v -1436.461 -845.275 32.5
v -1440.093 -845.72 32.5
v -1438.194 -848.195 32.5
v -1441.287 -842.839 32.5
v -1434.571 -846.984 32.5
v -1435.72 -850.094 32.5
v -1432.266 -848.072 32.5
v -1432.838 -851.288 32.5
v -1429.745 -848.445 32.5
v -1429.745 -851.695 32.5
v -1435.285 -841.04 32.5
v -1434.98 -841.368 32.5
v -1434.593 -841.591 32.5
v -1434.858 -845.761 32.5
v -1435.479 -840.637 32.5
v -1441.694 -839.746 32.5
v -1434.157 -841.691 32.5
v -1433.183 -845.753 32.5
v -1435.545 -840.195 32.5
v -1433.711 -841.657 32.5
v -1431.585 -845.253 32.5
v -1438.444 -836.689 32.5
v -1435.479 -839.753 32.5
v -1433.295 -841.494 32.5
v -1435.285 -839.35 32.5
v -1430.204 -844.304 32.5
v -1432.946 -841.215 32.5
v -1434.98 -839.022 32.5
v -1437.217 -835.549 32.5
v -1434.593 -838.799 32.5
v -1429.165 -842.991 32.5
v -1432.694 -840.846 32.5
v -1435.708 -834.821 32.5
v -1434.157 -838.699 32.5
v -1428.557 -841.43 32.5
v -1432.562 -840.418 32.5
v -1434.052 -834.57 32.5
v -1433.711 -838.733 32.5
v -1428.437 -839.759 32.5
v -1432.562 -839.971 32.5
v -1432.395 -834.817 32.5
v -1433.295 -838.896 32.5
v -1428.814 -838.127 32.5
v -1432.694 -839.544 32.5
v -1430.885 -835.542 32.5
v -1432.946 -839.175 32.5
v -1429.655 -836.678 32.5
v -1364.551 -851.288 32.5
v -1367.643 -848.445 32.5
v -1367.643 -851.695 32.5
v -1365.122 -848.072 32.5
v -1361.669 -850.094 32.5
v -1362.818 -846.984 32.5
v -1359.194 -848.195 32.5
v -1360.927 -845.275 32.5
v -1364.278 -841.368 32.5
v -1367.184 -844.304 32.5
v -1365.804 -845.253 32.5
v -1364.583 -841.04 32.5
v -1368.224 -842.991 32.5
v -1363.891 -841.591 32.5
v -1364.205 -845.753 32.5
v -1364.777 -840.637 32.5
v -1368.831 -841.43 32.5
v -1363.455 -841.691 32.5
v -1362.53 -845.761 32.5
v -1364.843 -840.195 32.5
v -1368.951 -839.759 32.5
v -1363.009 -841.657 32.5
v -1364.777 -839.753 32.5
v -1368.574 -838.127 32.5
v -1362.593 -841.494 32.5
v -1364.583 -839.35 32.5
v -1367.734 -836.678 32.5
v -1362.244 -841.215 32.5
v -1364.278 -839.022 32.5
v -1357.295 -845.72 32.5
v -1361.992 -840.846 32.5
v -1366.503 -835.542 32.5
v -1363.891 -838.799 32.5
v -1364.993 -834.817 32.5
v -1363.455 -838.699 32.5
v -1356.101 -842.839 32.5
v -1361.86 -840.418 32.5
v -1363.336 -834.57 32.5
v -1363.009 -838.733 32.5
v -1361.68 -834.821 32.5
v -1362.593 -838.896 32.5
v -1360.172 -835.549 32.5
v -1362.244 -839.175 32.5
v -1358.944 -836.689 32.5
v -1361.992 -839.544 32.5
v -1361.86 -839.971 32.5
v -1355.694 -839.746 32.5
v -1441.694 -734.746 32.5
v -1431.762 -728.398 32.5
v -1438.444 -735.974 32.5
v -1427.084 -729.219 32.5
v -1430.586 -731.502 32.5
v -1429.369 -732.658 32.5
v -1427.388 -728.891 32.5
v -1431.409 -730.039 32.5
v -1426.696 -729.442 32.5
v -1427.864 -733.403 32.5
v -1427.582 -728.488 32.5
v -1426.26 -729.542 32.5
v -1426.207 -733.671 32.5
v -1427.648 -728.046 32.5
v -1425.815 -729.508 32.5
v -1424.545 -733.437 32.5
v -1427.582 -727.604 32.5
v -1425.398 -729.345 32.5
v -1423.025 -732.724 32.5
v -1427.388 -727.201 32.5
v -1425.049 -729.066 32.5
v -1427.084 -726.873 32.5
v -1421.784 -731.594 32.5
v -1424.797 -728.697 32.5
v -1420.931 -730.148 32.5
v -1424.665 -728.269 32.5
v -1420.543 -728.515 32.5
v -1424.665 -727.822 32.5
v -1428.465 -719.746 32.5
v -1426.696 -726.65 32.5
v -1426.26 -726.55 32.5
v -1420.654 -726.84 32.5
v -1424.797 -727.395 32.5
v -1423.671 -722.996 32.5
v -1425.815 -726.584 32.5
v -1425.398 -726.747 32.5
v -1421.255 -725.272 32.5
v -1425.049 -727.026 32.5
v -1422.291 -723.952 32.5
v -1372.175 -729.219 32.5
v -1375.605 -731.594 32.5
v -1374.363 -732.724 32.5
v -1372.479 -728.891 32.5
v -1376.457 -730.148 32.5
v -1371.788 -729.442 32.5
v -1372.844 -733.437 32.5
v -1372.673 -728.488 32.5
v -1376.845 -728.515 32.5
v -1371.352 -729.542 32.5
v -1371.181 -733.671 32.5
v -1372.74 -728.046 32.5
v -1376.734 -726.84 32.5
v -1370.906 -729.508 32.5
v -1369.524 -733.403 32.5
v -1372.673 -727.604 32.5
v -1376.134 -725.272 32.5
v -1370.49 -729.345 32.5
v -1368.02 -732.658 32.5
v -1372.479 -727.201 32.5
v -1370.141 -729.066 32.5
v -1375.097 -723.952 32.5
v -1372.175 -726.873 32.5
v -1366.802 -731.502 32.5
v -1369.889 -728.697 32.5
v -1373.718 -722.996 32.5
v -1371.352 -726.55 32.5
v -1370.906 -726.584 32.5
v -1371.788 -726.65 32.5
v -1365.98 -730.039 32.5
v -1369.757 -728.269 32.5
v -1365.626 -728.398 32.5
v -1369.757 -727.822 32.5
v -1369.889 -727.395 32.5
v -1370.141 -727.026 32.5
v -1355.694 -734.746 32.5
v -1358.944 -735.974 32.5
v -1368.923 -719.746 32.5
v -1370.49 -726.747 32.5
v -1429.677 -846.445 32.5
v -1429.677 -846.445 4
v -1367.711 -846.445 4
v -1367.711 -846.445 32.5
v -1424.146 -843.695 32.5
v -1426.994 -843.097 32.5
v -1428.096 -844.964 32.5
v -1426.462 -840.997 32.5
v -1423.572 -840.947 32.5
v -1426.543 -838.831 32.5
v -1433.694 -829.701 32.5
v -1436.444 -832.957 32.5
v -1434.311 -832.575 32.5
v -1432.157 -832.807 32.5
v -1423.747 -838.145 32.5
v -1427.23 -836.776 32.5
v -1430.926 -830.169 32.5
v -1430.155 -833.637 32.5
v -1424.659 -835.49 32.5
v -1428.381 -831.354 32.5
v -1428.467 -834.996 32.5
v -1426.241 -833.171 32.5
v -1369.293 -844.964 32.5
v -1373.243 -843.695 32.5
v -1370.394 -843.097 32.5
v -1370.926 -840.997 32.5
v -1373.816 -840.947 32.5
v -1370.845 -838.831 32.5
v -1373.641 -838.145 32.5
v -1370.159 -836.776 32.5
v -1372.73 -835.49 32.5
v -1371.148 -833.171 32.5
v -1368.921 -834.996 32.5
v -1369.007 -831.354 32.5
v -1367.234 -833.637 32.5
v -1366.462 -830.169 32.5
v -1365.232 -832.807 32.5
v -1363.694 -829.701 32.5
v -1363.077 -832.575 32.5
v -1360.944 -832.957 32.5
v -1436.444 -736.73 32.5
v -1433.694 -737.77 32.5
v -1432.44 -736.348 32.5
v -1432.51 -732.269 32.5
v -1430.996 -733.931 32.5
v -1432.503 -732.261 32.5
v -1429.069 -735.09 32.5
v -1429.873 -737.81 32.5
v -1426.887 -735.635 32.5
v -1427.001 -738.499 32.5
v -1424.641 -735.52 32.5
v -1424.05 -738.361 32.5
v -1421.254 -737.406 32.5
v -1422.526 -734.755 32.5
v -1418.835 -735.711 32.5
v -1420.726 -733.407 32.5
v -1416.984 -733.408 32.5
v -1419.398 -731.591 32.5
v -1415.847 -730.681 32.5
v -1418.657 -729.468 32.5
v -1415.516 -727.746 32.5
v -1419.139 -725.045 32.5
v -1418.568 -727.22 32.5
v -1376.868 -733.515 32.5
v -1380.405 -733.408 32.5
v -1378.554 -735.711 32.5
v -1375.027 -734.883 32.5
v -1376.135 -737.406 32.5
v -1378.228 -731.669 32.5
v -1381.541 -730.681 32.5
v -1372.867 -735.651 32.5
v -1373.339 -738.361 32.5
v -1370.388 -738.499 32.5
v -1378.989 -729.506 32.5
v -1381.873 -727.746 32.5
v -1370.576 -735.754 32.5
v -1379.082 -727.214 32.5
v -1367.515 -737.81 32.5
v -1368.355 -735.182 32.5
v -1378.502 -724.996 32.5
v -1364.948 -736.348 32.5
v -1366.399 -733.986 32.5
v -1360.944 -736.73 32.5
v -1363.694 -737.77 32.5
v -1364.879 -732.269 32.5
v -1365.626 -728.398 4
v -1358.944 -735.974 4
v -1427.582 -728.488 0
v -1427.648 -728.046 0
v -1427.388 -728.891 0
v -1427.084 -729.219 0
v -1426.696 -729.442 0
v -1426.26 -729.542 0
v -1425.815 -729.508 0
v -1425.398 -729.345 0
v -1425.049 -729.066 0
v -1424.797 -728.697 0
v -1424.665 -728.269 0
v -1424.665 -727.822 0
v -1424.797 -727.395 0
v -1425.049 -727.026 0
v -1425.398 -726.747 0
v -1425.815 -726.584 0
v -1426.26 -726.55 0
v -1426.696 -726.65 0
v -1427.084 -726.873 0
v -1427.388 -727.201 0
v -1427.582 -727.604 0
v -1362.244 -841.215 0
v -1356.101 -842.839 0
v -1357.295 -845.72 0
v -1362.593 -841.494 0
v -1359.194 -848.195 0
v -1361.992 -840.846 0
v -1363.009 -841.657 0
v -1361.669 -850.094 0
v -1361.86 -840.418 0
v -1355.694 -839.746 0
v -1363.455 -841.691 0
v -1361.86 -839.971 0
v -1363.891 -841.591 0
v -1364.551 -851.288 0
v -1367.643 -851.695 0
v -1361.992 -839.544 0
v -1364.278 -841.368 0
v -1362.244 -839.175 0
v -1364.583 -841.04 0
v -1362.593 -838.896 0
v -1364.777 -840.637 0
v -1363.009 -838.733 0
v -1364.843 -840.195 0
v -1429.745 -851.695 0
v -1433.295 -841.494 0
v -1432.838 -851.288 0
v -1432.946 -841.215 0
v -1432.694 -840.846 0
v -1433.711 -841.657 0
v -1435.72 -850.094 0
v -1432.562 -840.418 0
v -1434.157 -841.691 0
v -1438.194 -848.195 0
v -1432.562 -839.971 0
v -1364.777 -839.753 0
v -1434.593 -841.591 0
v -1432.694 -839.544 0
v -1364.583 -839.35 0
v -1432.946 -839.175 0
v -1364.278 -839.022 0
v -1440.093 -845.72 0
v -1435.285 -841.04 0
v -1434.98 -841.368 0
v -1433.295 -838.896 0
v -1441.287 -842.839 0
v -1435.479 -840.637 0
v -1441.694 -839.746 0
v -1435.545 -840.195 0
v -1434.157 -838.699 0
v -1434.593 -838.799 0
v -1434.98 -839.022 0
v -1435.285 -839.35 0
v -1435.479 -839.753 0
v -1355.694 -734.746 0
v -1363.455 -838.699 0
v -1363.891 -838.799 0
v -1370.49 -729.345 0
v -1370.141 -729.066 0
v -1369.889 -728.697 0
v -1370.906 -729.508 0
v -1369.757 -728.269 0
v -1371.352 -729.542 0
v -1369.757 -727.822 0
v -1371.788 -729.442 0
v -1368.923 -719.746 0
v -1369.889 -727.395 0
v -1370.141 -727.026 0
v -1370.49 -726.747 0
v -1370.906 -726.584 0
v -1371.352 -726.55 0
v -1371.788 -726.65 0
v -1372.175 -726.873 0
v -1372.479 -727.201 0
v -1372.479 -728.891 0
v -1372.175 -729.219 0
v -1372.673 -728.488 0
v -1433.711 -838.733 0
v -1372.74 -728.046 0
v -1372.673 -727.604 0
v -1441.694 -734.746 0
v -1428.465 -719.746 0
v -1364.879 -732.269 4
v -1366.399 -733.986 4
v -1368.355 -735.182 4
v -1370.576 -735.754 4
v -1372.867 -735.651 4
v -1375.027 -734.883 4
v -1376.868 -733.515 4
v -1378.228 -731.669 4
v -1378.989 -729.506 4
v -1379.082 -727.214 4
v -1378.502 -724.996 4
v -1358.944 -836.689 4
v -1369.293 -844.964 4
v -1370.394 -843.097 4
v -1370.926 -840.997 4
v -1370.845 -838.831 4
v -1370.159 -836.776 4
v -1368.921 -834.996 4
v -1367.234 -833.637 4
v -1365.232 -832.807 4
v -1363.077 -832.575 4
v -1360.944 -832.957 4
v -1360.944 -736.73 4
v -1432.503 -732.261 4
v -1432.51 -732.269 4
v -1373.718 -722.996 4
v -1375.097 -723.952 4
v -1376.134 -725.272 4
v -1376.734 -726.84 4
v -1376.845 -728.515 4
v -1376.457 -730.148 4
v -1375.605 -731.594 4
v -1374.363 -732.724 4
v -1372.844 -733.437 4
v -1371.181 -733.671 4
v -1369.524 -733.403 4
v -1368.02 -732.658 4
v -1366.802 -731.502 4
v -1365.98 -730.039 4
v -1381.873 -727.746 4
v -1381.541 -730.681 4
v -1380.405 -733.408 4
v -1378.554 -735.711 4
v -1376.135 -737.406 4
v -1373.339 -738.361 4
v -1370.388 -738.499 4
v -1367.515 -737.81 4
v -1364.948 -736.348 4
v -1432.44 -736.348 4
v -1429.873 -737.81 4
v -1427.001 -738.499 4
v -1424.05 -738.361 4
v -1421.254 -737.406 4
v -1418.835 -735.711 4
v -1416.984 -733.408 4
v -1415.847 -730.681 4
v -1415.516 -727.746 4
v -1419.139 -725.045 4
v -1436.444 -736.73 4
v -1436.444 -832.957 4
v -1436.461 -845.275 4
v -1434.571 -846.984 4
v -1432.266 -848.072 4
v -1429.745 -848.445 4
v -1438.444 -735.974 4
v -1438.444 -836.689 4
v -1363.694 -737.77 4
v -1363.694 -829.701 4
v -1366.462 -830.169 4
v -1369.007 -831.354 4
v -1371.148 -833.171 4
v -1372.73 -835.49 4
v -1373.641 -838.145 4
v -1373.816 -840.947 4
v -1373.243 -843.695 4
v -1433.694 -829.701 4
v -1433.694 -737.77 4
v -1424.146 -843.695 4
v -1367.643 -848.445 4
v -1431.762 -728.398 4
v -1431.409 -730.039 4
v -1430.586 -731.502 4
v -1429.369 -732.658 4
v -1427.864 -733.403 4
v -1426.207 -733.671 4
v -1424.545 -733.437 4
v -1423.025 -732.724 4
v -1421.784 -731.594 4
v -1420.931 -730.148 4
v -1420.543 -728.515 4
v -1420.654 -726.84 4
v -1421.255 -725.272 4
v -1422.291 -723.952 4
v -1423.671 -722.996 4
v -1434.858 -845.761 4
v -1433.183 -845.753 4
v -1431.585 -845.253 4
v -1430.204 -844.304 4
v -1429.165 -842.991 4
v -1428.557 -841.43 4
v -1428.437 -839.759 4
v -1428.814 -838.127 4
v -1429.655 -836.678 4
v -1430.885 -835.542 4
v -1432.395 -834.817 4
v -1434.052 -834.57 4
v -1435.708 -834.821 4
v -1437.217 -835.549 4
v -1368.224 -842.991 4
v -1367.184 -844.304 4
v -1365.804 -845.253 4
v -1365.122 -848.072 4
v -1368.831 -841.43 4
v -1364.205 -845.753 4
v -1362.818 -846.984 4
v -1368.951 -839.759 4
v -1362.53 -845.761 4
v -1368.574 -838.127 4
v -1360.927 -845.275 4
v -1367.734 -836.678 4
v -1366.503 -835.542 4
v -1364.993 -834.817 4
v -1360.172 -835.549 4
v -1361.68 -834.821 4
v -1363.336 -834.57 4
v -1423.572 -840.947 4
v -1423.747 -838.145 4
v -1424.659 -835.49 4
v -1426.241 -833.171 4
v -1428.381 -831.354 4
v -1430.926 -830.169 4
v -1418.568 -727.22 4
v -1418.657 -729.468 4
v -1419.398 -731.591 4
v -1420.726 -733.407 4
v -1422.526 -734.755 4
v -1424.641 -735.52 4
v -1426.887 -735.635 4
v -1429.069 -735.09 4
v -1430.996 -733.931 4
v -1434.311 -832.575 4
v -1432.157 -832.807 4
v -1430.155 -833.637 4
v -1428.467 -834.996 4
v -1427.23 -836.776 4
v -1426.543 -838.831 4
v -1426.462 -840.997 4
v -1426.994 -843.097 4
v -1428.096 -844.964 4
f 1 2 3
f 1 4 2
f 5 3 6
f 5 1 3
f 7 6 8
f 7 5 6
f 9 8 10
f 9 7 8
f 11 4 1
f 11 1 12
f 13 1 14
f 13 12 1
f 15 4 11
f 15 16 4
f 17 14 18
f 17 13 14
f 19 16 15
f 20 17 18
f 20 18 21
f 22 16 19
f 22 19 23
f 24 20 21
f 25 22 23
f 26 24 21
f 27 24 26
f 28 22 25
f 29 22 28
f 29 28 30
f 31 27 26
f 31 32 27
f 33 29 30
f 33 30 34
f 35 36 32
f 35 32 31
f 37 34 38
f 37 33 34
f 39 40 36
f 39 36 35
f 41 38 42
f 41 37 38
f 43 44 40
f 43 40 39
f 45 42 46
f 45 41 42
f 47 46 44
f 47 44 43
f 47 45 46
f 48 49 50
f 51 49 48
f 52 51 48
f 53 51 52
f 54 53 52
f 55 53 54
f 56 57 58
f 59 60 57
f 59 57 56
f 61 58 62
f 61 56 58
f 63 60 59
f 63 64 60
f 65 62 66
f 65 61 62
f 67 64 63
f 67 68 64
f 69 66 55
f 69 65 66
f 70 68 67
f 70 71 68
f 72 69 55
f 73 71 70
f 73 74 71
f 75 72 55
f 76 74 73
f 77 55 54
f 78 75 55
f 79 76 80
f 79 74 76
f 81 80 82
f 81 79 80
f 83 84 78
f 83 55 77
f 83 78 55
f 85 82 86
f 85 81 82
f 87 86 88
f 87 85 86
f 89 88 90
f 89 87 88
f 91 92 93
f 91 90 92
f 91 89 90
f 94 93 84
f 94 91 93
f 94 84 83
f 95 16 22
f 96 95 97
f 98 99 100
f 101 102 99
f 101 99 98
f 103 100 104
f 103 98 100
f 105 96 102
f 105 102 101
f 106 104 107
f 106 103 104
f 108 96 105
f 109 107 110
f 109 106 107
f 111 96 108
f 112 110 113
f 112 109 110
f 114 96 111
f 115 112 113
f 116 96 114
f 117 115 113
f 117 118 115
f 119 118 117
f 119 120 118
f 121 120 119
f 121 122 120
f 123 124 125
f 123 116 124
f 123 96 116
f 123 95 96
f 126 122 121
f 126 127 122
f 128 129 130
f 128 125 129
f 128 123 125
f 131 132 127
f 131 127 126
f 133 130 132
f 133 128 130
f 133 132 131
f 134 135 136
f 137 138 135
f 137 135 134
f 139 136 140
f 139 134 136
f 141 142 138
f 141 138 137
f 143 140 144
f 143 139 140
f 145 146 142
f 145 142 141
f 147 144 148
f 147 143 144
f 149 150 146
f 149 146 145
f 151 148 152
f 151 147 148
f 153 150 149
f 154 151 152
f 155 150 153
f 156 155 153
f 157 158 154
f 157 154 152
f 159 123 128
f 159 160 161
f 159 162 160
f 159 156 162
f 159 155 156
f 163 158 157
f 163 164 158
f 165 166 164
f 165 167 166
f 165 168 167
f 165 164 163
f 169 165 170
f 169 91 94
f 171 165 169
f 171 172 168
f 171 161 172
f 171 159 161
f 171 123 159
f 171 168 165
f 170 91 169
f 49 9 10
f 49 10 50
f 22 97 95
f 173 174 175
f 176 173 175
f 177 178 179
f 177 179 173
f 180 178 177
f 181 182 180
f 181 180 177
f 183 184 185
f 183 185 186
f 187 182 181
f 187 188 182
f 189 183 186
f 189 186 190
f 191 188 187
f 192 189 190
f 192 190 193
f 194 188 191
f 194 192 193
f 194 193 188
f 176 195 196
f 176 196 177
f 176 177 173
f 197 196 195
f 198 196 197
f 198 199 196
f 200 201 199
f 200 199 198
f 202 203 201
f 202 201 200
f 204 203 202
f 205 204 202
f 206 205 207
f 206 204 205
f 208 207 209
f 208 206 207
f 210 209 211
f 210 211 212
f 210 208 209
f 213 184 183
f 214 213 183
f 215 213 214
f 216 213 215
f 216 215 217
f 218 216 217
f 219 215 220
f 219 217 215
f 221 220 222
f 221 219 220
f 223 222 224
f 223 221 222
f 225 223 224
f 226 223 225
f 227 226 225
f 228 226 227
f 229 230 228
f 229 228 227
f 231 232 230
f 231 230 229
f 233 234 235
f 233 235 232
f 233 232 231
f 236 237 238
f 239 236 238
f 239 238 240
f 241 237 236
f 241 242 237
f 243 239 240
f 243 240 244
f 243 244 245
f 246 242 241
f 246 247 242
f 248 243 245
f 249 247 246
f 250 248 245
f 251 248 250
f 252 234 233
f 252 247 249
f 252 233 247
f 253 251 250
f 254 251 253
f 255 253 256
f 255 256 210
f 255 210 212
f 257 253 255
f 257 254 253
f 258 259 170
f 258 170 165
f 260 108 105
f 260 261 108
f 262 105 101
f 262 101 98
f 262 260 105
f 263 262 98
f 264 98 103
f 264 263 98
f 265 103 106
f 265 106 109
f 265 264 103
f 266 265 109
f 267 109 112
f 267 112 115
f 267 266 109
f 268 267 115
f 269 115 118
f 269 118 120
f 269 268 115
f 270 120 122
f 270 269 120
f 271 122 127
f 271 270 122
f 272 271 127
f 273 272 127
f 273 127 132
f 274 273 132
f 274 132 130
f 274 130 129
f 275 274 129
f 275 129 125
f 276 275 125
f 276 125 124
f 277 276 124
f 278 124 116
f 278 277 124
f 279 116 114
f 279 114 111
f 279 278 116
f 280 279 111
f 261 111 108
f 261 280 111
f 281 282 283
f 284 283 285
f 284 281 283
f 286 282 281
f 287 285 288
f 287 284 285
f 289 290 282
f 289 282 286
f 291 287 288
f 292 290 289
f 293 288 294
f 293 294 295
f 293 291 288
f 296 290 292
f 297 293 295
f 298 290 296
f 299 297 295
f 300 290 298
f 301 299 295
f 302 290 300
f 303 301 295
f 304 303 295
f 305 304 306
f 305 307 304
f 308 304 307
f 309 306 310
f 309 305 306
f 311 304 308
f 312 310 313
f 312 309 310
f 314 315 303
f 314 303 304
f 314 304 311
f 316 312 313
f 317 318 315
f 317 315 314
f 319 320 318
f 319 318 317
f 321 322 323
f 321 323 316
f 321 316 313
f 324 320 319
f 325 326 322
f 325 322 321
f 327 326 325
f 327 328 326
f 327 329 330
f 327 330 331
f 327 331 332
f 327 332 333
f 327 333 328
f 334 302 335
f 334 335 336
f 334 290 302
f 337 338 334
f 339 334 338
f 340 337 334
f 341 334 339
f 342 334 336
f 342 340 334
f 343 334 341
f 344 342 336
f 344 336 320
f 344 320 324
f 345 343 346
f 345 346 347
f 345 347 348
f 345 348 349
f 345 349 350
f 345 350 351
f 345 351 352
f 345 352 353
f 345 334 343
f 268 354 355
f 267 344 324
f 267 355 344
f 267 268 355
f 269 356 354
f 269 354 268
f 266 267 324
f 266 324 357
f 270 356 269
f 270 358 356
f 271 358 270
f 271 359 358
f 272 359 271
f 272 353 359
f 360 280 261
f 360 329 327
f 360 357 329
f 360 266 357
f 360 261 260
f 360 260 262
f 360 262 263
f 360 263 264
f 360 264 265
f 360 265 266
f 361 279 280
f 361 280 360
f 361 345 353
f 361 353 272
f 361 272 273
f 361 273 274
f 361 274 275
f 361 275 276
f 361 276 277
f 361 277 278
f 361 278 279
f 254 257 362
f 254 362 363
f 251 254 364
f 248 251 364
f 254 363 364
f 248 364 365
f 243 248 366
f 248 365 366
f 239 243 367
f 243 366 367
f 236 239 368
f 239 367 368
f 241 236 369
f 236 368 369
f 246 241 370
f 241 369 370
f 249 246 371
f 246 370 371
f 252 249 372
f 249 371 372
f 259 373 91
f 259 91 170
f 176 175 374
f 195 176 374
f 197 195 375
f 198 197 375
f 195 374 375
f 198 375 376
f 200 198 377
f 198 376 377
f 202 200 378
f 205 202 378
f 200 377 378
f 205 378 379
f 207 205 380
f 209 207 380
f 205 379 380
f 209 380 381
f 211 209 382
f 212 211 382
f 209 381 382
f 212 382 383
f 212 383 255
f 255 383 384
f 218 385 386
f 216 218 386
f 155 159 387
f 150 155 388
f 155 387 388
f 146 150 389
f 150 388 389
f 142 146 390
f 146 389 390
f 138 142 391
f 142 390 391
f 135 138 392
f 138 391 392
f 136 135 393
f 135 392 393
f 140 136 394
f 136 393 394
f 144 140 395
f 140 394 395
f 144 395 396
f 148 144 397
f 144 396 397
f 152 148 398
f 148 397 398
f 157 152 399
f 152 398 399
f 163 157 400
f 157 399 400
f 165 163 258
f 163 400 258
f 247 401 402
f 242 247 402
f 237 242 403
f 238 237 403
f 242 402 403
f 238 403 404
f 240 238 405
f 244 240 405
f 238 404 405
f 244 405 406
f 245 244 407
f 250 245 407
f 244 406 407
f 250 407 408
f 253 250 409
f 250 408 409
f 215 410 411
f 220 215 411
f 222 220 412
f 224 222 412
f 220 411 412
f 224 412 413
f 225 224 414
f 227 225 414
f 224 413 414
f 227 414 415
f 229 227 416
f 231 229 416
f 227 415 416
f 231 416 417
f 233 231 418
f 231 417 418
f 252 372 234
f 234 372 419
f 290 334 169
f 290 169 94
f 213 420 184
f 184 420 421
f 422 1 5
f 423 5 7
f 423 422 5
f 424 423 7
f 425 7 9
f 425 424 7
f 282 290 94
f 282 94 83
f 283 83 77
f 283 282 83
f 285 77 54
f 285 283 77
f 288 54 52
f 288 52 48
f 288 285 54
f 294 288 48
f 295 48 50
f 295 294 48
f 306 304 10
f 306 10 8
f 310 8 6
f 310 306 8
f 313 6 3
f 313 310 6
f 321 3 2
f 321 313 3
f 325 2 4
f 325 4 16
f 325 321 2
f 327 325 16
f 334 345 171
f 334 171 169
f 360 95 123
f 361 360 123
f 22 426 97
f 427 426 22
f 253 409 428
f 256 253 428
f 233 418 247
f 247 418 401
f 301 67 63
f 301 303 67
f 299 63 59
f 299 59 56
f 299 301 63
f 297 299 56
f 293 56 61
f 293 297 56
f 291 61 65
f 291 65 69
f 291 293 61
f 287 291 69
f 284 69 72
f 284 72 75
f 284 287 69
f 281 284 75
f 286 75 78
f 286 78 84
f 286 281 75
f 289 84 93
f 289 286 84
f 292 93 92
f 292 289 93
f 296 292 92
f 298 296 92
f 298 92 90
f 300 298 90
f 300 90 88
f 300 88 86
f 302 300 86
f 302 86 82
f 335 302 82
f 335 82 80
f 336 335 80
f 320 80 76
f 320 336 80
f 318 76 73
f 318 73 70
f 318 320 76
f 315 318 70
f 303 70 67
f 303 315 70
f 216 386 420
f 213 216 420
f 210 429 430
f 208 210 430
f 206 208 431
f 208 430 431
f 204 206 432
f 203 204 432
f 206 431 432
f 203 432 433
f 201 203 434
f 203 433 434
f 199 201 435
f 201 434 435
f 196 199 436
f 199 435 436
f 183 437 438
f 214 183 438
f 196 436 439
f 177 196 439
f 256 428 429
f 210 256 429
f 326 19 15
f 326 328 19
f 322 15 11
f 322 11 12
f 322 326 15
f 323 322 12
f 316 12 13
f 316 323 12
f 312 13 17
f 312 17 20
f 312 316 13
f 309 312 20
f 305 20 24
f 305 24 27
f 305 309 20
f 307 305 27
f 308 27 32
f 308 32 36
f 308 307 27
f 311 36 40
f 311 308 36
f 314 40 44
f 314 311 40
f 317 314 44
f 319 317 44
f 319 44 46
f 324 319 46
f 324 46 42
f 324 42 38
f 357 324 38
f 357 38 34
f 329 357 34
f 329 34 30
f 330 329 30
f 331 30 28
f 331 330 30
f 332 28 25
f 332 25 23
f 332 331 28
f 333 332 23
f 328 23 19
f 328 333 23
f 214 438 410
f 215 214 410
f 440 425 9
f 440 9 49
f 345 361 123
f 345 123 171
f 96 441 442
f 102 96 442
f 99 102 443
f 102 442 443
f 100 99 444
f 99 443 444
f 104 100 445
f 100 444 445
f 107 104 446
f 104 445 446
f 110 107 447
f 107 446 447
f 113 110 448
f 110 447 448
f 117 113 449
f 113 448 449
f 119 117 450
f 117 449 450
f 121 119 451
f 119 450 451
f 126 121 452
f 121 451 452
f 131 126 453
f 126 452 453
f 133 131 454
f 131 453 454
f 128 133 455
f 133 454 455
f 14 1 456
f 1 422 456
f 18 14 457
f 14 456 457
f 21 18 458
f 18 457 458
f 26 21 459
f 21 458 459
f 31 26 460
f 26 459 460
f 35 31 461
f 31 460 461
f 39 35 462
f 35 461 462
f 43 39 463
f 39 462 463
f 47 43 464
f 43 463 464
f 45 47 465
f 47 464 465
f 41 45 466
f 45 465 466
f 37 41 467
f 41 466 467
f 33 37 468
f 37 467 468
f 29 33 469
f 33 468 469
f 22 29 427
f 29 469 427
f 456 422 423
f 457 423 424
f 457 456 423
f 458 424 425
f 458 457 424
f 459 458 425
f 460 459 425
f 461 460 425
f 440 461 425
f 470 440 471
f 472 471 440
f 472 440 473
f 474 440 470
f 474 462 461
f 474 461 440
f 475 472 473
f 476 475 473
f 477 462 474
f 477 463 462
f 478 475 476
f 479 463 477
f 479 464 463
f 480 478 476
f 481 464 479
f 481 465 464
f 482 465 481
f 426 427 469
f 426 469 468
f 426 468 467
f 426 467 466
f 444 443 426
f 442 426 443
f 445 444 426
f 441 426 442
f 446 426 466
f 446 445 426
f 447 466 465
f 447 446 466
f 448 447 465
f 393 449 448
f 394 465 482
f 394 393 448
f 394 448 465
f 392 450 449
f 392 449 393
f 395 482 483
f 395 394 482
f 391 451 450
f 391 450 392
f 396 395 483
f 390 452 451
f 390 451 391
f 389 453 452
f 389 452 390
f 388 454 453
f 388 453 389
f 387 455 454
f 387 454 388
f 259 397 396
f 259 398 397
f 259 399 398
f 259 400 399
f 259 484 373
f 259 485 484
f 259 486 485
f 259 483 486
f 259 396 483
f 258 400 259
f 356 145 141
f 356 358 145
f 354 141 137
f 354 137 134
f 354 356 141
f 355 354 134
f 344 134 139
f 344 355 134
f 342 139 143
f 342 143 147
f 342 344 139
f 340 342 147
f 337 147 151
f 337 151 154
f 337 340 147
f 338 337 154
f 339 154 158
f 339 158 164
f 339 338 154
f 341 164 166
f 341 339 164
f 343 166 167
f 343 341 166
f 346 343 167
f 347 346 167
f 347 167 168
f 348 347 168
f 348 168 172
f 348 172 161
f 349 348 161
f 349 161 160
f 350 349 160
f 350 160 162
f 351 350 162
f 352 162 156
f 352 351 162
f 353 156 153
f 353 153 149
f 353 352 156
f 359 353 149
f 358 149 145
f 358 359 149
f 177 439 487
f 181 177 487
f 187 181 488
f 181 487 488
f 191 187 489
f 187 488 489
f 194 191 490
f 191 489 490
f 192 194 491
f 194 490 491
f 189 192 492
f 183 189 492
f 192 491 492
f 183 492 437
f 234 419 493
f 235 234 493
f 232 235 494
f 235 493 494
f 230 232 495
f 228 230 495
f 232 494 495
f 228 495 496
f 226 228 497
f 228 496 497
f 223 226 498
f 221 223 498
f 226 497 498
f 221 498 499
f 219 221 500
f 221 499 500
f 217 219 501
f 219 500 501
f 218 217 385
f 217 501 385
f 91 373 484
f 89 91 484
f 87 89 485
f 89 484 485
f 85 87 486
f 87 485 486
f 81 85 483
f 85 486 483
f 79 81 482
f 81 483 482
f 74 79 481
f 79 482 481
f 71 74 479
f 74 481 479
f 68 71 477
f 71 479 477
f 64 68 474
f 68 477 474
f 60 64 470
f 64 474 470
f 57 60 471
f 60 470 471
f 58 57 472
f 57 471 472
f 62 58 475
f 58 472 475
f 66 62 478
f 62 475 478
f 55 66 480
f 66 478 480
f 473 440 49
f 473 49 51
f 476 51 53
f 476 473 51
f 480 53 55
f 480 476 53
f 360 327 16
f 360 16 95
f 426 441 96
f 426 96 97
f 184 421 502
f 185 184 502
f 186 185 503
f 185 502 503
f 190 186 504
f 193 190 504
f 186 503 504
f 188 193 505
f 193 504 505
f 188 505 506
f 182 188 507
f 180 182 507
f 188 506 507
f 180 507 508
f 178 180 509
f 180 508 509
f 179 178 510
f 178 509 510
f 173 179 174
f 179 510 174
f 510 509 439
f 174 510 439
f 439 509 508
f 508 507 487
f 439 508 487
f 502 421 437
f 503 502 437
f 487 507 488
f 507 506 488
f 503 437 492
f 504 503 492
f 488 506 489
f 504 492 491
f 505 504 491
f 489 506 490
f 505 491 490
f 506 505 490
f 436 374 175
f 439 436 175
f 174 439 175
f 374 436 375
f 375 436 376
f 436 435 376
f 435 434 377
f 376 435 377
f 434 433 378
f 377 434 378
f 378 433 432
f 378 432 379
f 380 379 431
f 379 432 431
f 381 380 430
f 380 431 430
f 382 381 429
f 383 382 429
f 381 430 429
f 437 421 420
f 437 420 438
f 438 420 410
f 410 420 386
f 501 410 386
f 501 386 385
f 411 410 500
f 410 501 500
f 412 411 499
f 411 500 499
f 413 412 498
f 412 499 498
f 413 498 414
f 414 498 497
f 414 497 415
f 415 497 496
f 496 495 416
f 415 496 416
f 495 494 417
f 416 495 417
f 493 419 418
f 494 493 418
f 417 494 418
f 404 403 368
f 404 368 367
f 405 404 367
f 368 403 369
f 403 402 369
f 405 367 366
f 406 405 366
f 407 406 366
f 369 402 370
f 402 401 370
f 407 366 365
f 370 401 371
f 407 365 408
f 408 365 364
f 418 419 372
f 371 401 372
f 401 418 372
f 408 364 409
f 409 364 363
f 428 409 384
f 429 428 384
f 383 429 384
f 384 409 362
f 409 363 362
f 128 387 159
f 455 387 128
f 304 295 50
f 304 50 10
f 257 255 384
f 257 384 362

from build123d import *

# Parameters (mm, degrees)
BOSS_EXTRUDE1_DEPTH     = 32.5
CUT_EXTRUDE3_DEPTH      = 1675.790348595
CUT_EXTRUDE3_DEPTH_BACK = 28.5
SKETCH32_R              = 5.625
SKETCH32_R_2            = 1.5
BOSS_EXTRUDE5_DEPTH     = 28.5
CUT_EXTRUDE15_START     = -4
SKETCH33_R              = 1.5
CUT_EXTRUDE15_DEPTH     = 4
BOSS_EXTRUDE6_DEPTH     = 28.5


with BuildPart() as part:
    # Sketch1 → Boss-Extrude1 (new body)
    with BuildSketch(Plane.XY):
        with BuildLine():
            Line((-1355.694223154, -734.745915254), (-1355.694223154, -839.745915254))
            ThreePointArc((-1355.694223154, -839.745915254), (-1359.194004226, -848.195134183), (-1367.643223154, -851.694915254))
            Line((-1367.643223154, -851.694915254), (-1429.745223154, -851.694915254))
            ThreePointArc((-1429.745223154, -851.694915254), (-1438.194442083, -848.195134183), (-1441.694223154, -839.745915254))
            Line((-1441.694223154, -839.745915254), (-1441.694223154, -734.745915254))
            Line((-1441.694223154, -734.745915254), (-1428.465466599, -719.745915254))
            Line((-1428.465466599, -719.745915254), (-1368.92297971, -719.745915254))
            Line((-1368.92297971, -719.745915254), (-1355.694223154, -734.745915254))
        make_face()
    extrude(amount=BOSS_EXTRUDE1_DEPTH)

    # Sketch2 → Cut-Extrude3 (cut, two sides: drawn at the far end of the back side and taken through both)
    with BuildSketch(Plane.XY.offset(32.5).offset(-CUT_EXTRUDE3_DEPTH_BACK)):
        with BuildLine():
            Line((-1358.944223154, -735.974299792), (-1370.390082456, -722.995915254))
            Line((-1370.390082456, -722.995915254), (-1426.998363853, -722.995915254))
            Line((-1426.998363853, -722.995915254), (-1438.444223154, -735.974299792))
            Line((-1438.444223154, -735.974299792), (-1438.444223154, -839.745915254))
            ThreePointArc((-1438.444223154, -839.745915254), (-1435.896345044, -845.897037144), (-1429.745223154, -848.444915254))
            Line((-1429.745223154, -848.444915254), (-1367.643223154, -848.444915254))
            ThreePointArc((-1367.643223154, -848.444915254), (-1361.492101265, -845.897037144), (-1358.944223154, -839.745915254))
            Line((-1358.944223154, -839.745915254), (-1358.944223154, -735.974299792))
        make_face()
    extrude(amount=CUT_EXTRUDE3_DEPTH + CUT_EXTRUDE3_DEPTH_BACK, mode=Mode.SUBTRACT)

    # Sketch32 → Boss-Extrude5 (add)
    # profile 1 of 4: a face of its own
    with BuildSketch(Plane.XY.offset(4)):
        with Locations((-1426.148363853, -728.045915254)):
            Circle(SKETCH32_R)
        with Locations(Location((-1426.148363853, -728.045915254, 0), (0, 0, 180))):
            Circle(SKETCH32_R_2, mode=Mode.SUBTRACT)
    # profile 2 of 4: a face of its own
    with BuildSketch(Plane.XY.offset(4)):
        with Locations((-1371.240082456, -728.045915254)):
            Circle(SKETCH32_R)
        with Locations(Location((-1371.240082456, -728.045915254, 0), (0, 0, 180))):
            Circle(SKETCH32_R_2, mode=Mode.SUBTRACT)
    # profile 3 of 4: a face of its own
    with BuildSketch(Plane.XY.offset(4)):
        with Locations((-1434.045223154, -840.194915254)):
            Circle(SKETCH32_R)
        with Locations(Location((-1434.045223154, -840.194915254, 0), (0, 0, 180))):
            Circle(SKETCH32_R_2, mode=Mode.SUBTRACT)
    # profile 4 of 4: a face of its own
    with BuildSketch(Plane.XY.offset(4)):
        with Locations((-1363.343223154, -840.194915254)):
            Circle(SKETCH32_R)
        with Locations(Location((-1363.343223154, -840.194915254, 0), (0, 0, 180))):
            Circle(SKETCH32_R_2, mode=Mode.SUBTRACT)
    extrude(amount=BOSS_EXTRUDE5_DEPTH)

    # Sketch33 → Cut-Extrude15 (cut)
    with BuildSketch(Plane.XY.offset(4).offset(CUT_EXTRUDE15_START)):
        with Locations(Location((-1363.343223154, -840.194915254, 0), (0, 0, 180))):
            Circle(SKETCH33_R)
        with Locations(Location((-1434.045223154, -840.194915254, 0), (0, 0, 180))):
            Circle(SKETCH33_R)
        with Locations(Location((-1426.148363853, -728.045915254, 0), (0, 0, 180))):
            Circle(SKETCH33_R)
        with Locations(Location((-1371.240082456, -728.045915254, 0), (0, 0, 180))):
            Circle(SKETCH33_R)
    extrude(amount=CUT_EXTRUDE15_DEPTH, mode=Mode.SUBTRACT)


with BuildPart() as body_2:
    # Sketch34 → Boss-Extrude6 (new body)
    with BuildSketch(Plane.XY.offset(4)):
        with BuildLine():
            Line((-1429.677371852, -846.444915254), (-1429.46264746, -846.444915254))
            Line((-1429.46264746, -846.444915254), (-1367.925798849, -846.444915254))
            Line((-1367.925798849, -846.444915254), (-1367.711074457, -846.444915254))
            ThreePointArc((-1367.711074457, -846.444915254), (-1370.158582994, -836.775632396), (-1360.944223154, -832.957137695))
            Line((-1360.944223154, -832.957137695), (-1360.944223154, -736.730228738))
            Line((-1360.944223154, -736.730228738), (-1364.878806544, -732.268830526))
            ThreePointArc((-1364.878806544, -732.268830526), (-1375.027139432, -734.882628606), (-1378.501833651, -724.995915254))
            Line((-1378.501833651, -724.995915254), (-1419.138777697, -725.044860951))
            ThreePointArc((-1419.138777697, -725.044860951), (-1422.525552734, -734.75530156), (-1432.5025393, -732.260779355))
            Line((-1432.5025393, -732.260779355), (-1432.509639765, -732.268830526))
            Line((-1432.509639765, -732.268830526), (-1436.444223154, -736.730228738))
            Line((-1436.444223154, -736.730228738), (-1436.444223154, -832.957137695))
            ThreePointArc((-1436.444223154, -832.957137695), (-1427.229863315, -836.775632396), (-1429.677371852, -846.444915254))
        make_face()
        with BuildLine():
            Line((-1363.694223154, -737.769631038), (-1363.694223154, -829.700783608))
            ThreePointArc((-1363.694223154, -829.700783608), (-1372.01657843, -834.276899687), (-1373.242718091, -843.694915254))
            Line((-1373.242718091, -843.694915254), (-1424.145728218, -843.694915254))
            ThreePointArc((-1424.145728218, -843.694915254), (-1425.371867879, -834.276899687), (-1433.694223154, -829.700783608))
            Line((-1433.694223154, -829.700783608), (-1433.694223154, -737.769631038))
            Line((-1433.694223154, -737.769631038), (-1432.440153254, -736.347649431))
            ThreePointArc((-1432.440153254, -736.347649431), (-1421.253894222, -737.406357088), (-1415.515504499, -727.745915254))
            Line((-1415.515504499, -727.745915254), (-1381.872941809, -727.745915254))
            ThreePointArc((-1381.872941809, -727.745915254), (-1376.134552087, -737.406357088), (-1364.948293055, -736.347649431))
            Line((-1364.948293055, -736.347649431), (-1363.694223154, -737.769631038))
        make_face(mode=Mode.SUBTRACT)
    extrude(amount=BOSS_EXTRUDE6_DEPTH)


solid = Compound([part.part, body_2.part])
